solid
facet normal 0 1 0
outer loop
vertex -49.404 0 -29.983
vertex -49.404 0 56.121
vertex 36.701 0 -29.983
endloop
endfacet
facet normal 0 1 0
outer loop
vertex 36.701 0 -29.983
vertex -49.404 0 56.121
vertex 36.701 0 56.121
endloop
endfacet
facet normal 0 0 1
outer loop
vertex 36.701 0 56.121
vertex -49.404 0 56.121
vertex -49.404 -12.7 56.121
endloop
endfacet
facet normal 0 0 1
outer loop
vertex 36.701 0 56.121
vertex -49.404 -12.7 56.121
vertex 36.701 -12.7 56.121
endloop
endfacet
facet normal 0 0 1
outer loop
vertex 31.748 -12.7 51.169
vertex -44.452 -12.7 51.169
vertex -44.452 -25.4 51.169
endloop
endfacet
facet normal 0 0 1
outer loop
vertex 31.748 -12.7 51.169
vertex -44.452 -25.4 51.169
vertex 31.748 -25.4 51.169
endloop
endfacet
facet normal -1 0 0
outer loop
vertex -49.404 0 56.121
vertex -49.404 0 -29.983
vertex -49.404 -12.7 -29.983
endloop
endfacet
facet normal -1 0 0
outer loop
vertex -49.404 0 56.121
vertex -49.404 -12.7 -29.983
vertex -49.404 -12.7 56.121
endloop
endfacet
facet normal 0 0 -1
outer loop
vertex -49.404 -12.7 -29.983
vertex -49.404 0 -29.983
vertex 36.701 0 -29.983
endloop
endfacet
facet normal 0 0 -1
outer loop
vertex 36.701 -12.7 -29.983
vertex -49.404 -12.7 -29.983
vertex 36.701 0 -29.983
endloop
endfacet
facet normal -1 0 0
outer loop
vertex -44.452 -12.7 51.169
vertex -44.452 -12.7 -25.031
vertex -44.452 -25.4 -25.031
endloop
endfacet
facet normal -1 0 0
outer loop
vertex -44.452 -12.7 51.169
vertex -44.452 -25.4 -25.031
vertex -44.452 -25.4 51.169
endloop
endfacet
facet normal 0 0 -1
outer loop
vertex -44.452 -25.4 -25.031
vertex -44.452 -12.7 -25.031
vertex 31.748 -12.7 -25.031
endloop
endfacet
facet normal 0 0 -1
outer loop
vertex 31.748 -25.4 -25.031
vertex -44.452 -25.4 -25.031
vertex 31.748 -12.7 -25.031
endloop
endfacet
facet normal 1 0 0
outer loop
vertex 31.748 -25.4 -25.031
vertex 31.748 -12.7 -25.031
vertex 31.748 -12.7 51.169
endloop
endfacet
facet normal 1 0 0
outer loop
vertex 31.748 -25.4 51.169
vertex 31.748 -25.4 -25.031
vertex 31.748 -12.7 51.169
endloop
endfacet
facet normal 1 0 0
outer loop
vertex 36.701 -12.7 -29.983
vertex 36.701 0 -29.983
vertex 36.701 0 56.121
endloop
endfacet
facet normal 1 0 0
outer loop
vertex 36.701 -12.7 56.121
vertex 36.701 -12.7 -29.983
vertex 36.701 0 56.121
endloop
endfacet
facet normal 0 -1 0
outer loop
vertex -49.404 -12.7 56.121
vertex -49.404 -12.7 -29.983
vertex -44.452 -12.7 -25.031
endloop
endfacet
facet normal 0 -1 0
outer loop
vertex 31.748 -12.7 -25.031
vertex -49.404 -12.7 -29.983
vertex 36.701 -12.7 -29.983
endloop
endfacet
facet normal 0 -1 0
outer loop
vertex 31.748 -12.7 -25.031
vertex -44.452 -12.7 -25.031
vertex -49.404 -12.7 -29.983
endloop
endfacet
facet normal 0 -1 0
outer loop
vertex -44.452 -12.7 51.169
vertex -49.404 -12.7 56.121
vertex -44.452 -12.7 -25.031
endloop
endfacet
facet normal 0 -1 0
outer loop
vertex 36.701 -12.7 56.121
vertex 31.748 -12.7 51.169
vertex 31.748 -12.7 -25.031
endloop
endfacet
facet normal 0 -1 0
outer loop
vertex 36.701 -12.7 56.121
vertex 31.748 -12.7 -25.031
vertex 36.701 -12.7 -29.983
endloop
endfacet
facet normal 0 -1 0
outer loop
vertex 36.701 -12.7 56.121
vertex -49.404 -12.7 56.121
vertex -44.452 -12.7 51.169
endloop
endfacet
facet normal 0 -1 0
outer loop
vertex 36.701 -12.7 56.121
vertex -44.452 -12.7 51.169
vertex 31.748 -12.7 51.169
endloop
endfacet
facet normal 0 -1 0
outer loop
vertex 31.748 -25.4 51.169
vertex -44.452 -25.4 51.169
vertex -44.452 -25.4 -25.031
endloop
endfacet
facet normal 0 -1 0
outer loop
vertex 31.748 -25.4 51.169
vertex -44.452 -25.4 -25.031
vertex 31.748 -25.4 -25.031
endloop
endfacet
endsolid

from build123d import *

# Parameters (mm, degrees)
F0_W     = 76.2
F0_H     = 76.2
F1_DEPTH = 25.4
F0_W_2   = 86.104107
F0_H_2   = 86.104107
F2_DEPTH = 12.7


with BuildPart() as f1:
    # F0 (on Front) → F1 (new body)
    with BuildSketch(Plane.XZ):
        with Locations((-6.351506, 13.068704)):
            Rectangle(F0_W, F0_H)
    extrude(amount=F1_DEPTH)

    # F0 (on Front) → F2 (join)
    with BuildSketch(Plane.XZ):
        with Locations((-6.351506, 13.068703)):
            Rectangle(F0_W_2, F0_H_2)
        with Locations((-6.351506, 13.068704)):
            Rectangle(F0_W, F0_H, mode=Mode.SUBTRACT)
    extrude(amount=F2_DEPTH)


solid = f1.part
